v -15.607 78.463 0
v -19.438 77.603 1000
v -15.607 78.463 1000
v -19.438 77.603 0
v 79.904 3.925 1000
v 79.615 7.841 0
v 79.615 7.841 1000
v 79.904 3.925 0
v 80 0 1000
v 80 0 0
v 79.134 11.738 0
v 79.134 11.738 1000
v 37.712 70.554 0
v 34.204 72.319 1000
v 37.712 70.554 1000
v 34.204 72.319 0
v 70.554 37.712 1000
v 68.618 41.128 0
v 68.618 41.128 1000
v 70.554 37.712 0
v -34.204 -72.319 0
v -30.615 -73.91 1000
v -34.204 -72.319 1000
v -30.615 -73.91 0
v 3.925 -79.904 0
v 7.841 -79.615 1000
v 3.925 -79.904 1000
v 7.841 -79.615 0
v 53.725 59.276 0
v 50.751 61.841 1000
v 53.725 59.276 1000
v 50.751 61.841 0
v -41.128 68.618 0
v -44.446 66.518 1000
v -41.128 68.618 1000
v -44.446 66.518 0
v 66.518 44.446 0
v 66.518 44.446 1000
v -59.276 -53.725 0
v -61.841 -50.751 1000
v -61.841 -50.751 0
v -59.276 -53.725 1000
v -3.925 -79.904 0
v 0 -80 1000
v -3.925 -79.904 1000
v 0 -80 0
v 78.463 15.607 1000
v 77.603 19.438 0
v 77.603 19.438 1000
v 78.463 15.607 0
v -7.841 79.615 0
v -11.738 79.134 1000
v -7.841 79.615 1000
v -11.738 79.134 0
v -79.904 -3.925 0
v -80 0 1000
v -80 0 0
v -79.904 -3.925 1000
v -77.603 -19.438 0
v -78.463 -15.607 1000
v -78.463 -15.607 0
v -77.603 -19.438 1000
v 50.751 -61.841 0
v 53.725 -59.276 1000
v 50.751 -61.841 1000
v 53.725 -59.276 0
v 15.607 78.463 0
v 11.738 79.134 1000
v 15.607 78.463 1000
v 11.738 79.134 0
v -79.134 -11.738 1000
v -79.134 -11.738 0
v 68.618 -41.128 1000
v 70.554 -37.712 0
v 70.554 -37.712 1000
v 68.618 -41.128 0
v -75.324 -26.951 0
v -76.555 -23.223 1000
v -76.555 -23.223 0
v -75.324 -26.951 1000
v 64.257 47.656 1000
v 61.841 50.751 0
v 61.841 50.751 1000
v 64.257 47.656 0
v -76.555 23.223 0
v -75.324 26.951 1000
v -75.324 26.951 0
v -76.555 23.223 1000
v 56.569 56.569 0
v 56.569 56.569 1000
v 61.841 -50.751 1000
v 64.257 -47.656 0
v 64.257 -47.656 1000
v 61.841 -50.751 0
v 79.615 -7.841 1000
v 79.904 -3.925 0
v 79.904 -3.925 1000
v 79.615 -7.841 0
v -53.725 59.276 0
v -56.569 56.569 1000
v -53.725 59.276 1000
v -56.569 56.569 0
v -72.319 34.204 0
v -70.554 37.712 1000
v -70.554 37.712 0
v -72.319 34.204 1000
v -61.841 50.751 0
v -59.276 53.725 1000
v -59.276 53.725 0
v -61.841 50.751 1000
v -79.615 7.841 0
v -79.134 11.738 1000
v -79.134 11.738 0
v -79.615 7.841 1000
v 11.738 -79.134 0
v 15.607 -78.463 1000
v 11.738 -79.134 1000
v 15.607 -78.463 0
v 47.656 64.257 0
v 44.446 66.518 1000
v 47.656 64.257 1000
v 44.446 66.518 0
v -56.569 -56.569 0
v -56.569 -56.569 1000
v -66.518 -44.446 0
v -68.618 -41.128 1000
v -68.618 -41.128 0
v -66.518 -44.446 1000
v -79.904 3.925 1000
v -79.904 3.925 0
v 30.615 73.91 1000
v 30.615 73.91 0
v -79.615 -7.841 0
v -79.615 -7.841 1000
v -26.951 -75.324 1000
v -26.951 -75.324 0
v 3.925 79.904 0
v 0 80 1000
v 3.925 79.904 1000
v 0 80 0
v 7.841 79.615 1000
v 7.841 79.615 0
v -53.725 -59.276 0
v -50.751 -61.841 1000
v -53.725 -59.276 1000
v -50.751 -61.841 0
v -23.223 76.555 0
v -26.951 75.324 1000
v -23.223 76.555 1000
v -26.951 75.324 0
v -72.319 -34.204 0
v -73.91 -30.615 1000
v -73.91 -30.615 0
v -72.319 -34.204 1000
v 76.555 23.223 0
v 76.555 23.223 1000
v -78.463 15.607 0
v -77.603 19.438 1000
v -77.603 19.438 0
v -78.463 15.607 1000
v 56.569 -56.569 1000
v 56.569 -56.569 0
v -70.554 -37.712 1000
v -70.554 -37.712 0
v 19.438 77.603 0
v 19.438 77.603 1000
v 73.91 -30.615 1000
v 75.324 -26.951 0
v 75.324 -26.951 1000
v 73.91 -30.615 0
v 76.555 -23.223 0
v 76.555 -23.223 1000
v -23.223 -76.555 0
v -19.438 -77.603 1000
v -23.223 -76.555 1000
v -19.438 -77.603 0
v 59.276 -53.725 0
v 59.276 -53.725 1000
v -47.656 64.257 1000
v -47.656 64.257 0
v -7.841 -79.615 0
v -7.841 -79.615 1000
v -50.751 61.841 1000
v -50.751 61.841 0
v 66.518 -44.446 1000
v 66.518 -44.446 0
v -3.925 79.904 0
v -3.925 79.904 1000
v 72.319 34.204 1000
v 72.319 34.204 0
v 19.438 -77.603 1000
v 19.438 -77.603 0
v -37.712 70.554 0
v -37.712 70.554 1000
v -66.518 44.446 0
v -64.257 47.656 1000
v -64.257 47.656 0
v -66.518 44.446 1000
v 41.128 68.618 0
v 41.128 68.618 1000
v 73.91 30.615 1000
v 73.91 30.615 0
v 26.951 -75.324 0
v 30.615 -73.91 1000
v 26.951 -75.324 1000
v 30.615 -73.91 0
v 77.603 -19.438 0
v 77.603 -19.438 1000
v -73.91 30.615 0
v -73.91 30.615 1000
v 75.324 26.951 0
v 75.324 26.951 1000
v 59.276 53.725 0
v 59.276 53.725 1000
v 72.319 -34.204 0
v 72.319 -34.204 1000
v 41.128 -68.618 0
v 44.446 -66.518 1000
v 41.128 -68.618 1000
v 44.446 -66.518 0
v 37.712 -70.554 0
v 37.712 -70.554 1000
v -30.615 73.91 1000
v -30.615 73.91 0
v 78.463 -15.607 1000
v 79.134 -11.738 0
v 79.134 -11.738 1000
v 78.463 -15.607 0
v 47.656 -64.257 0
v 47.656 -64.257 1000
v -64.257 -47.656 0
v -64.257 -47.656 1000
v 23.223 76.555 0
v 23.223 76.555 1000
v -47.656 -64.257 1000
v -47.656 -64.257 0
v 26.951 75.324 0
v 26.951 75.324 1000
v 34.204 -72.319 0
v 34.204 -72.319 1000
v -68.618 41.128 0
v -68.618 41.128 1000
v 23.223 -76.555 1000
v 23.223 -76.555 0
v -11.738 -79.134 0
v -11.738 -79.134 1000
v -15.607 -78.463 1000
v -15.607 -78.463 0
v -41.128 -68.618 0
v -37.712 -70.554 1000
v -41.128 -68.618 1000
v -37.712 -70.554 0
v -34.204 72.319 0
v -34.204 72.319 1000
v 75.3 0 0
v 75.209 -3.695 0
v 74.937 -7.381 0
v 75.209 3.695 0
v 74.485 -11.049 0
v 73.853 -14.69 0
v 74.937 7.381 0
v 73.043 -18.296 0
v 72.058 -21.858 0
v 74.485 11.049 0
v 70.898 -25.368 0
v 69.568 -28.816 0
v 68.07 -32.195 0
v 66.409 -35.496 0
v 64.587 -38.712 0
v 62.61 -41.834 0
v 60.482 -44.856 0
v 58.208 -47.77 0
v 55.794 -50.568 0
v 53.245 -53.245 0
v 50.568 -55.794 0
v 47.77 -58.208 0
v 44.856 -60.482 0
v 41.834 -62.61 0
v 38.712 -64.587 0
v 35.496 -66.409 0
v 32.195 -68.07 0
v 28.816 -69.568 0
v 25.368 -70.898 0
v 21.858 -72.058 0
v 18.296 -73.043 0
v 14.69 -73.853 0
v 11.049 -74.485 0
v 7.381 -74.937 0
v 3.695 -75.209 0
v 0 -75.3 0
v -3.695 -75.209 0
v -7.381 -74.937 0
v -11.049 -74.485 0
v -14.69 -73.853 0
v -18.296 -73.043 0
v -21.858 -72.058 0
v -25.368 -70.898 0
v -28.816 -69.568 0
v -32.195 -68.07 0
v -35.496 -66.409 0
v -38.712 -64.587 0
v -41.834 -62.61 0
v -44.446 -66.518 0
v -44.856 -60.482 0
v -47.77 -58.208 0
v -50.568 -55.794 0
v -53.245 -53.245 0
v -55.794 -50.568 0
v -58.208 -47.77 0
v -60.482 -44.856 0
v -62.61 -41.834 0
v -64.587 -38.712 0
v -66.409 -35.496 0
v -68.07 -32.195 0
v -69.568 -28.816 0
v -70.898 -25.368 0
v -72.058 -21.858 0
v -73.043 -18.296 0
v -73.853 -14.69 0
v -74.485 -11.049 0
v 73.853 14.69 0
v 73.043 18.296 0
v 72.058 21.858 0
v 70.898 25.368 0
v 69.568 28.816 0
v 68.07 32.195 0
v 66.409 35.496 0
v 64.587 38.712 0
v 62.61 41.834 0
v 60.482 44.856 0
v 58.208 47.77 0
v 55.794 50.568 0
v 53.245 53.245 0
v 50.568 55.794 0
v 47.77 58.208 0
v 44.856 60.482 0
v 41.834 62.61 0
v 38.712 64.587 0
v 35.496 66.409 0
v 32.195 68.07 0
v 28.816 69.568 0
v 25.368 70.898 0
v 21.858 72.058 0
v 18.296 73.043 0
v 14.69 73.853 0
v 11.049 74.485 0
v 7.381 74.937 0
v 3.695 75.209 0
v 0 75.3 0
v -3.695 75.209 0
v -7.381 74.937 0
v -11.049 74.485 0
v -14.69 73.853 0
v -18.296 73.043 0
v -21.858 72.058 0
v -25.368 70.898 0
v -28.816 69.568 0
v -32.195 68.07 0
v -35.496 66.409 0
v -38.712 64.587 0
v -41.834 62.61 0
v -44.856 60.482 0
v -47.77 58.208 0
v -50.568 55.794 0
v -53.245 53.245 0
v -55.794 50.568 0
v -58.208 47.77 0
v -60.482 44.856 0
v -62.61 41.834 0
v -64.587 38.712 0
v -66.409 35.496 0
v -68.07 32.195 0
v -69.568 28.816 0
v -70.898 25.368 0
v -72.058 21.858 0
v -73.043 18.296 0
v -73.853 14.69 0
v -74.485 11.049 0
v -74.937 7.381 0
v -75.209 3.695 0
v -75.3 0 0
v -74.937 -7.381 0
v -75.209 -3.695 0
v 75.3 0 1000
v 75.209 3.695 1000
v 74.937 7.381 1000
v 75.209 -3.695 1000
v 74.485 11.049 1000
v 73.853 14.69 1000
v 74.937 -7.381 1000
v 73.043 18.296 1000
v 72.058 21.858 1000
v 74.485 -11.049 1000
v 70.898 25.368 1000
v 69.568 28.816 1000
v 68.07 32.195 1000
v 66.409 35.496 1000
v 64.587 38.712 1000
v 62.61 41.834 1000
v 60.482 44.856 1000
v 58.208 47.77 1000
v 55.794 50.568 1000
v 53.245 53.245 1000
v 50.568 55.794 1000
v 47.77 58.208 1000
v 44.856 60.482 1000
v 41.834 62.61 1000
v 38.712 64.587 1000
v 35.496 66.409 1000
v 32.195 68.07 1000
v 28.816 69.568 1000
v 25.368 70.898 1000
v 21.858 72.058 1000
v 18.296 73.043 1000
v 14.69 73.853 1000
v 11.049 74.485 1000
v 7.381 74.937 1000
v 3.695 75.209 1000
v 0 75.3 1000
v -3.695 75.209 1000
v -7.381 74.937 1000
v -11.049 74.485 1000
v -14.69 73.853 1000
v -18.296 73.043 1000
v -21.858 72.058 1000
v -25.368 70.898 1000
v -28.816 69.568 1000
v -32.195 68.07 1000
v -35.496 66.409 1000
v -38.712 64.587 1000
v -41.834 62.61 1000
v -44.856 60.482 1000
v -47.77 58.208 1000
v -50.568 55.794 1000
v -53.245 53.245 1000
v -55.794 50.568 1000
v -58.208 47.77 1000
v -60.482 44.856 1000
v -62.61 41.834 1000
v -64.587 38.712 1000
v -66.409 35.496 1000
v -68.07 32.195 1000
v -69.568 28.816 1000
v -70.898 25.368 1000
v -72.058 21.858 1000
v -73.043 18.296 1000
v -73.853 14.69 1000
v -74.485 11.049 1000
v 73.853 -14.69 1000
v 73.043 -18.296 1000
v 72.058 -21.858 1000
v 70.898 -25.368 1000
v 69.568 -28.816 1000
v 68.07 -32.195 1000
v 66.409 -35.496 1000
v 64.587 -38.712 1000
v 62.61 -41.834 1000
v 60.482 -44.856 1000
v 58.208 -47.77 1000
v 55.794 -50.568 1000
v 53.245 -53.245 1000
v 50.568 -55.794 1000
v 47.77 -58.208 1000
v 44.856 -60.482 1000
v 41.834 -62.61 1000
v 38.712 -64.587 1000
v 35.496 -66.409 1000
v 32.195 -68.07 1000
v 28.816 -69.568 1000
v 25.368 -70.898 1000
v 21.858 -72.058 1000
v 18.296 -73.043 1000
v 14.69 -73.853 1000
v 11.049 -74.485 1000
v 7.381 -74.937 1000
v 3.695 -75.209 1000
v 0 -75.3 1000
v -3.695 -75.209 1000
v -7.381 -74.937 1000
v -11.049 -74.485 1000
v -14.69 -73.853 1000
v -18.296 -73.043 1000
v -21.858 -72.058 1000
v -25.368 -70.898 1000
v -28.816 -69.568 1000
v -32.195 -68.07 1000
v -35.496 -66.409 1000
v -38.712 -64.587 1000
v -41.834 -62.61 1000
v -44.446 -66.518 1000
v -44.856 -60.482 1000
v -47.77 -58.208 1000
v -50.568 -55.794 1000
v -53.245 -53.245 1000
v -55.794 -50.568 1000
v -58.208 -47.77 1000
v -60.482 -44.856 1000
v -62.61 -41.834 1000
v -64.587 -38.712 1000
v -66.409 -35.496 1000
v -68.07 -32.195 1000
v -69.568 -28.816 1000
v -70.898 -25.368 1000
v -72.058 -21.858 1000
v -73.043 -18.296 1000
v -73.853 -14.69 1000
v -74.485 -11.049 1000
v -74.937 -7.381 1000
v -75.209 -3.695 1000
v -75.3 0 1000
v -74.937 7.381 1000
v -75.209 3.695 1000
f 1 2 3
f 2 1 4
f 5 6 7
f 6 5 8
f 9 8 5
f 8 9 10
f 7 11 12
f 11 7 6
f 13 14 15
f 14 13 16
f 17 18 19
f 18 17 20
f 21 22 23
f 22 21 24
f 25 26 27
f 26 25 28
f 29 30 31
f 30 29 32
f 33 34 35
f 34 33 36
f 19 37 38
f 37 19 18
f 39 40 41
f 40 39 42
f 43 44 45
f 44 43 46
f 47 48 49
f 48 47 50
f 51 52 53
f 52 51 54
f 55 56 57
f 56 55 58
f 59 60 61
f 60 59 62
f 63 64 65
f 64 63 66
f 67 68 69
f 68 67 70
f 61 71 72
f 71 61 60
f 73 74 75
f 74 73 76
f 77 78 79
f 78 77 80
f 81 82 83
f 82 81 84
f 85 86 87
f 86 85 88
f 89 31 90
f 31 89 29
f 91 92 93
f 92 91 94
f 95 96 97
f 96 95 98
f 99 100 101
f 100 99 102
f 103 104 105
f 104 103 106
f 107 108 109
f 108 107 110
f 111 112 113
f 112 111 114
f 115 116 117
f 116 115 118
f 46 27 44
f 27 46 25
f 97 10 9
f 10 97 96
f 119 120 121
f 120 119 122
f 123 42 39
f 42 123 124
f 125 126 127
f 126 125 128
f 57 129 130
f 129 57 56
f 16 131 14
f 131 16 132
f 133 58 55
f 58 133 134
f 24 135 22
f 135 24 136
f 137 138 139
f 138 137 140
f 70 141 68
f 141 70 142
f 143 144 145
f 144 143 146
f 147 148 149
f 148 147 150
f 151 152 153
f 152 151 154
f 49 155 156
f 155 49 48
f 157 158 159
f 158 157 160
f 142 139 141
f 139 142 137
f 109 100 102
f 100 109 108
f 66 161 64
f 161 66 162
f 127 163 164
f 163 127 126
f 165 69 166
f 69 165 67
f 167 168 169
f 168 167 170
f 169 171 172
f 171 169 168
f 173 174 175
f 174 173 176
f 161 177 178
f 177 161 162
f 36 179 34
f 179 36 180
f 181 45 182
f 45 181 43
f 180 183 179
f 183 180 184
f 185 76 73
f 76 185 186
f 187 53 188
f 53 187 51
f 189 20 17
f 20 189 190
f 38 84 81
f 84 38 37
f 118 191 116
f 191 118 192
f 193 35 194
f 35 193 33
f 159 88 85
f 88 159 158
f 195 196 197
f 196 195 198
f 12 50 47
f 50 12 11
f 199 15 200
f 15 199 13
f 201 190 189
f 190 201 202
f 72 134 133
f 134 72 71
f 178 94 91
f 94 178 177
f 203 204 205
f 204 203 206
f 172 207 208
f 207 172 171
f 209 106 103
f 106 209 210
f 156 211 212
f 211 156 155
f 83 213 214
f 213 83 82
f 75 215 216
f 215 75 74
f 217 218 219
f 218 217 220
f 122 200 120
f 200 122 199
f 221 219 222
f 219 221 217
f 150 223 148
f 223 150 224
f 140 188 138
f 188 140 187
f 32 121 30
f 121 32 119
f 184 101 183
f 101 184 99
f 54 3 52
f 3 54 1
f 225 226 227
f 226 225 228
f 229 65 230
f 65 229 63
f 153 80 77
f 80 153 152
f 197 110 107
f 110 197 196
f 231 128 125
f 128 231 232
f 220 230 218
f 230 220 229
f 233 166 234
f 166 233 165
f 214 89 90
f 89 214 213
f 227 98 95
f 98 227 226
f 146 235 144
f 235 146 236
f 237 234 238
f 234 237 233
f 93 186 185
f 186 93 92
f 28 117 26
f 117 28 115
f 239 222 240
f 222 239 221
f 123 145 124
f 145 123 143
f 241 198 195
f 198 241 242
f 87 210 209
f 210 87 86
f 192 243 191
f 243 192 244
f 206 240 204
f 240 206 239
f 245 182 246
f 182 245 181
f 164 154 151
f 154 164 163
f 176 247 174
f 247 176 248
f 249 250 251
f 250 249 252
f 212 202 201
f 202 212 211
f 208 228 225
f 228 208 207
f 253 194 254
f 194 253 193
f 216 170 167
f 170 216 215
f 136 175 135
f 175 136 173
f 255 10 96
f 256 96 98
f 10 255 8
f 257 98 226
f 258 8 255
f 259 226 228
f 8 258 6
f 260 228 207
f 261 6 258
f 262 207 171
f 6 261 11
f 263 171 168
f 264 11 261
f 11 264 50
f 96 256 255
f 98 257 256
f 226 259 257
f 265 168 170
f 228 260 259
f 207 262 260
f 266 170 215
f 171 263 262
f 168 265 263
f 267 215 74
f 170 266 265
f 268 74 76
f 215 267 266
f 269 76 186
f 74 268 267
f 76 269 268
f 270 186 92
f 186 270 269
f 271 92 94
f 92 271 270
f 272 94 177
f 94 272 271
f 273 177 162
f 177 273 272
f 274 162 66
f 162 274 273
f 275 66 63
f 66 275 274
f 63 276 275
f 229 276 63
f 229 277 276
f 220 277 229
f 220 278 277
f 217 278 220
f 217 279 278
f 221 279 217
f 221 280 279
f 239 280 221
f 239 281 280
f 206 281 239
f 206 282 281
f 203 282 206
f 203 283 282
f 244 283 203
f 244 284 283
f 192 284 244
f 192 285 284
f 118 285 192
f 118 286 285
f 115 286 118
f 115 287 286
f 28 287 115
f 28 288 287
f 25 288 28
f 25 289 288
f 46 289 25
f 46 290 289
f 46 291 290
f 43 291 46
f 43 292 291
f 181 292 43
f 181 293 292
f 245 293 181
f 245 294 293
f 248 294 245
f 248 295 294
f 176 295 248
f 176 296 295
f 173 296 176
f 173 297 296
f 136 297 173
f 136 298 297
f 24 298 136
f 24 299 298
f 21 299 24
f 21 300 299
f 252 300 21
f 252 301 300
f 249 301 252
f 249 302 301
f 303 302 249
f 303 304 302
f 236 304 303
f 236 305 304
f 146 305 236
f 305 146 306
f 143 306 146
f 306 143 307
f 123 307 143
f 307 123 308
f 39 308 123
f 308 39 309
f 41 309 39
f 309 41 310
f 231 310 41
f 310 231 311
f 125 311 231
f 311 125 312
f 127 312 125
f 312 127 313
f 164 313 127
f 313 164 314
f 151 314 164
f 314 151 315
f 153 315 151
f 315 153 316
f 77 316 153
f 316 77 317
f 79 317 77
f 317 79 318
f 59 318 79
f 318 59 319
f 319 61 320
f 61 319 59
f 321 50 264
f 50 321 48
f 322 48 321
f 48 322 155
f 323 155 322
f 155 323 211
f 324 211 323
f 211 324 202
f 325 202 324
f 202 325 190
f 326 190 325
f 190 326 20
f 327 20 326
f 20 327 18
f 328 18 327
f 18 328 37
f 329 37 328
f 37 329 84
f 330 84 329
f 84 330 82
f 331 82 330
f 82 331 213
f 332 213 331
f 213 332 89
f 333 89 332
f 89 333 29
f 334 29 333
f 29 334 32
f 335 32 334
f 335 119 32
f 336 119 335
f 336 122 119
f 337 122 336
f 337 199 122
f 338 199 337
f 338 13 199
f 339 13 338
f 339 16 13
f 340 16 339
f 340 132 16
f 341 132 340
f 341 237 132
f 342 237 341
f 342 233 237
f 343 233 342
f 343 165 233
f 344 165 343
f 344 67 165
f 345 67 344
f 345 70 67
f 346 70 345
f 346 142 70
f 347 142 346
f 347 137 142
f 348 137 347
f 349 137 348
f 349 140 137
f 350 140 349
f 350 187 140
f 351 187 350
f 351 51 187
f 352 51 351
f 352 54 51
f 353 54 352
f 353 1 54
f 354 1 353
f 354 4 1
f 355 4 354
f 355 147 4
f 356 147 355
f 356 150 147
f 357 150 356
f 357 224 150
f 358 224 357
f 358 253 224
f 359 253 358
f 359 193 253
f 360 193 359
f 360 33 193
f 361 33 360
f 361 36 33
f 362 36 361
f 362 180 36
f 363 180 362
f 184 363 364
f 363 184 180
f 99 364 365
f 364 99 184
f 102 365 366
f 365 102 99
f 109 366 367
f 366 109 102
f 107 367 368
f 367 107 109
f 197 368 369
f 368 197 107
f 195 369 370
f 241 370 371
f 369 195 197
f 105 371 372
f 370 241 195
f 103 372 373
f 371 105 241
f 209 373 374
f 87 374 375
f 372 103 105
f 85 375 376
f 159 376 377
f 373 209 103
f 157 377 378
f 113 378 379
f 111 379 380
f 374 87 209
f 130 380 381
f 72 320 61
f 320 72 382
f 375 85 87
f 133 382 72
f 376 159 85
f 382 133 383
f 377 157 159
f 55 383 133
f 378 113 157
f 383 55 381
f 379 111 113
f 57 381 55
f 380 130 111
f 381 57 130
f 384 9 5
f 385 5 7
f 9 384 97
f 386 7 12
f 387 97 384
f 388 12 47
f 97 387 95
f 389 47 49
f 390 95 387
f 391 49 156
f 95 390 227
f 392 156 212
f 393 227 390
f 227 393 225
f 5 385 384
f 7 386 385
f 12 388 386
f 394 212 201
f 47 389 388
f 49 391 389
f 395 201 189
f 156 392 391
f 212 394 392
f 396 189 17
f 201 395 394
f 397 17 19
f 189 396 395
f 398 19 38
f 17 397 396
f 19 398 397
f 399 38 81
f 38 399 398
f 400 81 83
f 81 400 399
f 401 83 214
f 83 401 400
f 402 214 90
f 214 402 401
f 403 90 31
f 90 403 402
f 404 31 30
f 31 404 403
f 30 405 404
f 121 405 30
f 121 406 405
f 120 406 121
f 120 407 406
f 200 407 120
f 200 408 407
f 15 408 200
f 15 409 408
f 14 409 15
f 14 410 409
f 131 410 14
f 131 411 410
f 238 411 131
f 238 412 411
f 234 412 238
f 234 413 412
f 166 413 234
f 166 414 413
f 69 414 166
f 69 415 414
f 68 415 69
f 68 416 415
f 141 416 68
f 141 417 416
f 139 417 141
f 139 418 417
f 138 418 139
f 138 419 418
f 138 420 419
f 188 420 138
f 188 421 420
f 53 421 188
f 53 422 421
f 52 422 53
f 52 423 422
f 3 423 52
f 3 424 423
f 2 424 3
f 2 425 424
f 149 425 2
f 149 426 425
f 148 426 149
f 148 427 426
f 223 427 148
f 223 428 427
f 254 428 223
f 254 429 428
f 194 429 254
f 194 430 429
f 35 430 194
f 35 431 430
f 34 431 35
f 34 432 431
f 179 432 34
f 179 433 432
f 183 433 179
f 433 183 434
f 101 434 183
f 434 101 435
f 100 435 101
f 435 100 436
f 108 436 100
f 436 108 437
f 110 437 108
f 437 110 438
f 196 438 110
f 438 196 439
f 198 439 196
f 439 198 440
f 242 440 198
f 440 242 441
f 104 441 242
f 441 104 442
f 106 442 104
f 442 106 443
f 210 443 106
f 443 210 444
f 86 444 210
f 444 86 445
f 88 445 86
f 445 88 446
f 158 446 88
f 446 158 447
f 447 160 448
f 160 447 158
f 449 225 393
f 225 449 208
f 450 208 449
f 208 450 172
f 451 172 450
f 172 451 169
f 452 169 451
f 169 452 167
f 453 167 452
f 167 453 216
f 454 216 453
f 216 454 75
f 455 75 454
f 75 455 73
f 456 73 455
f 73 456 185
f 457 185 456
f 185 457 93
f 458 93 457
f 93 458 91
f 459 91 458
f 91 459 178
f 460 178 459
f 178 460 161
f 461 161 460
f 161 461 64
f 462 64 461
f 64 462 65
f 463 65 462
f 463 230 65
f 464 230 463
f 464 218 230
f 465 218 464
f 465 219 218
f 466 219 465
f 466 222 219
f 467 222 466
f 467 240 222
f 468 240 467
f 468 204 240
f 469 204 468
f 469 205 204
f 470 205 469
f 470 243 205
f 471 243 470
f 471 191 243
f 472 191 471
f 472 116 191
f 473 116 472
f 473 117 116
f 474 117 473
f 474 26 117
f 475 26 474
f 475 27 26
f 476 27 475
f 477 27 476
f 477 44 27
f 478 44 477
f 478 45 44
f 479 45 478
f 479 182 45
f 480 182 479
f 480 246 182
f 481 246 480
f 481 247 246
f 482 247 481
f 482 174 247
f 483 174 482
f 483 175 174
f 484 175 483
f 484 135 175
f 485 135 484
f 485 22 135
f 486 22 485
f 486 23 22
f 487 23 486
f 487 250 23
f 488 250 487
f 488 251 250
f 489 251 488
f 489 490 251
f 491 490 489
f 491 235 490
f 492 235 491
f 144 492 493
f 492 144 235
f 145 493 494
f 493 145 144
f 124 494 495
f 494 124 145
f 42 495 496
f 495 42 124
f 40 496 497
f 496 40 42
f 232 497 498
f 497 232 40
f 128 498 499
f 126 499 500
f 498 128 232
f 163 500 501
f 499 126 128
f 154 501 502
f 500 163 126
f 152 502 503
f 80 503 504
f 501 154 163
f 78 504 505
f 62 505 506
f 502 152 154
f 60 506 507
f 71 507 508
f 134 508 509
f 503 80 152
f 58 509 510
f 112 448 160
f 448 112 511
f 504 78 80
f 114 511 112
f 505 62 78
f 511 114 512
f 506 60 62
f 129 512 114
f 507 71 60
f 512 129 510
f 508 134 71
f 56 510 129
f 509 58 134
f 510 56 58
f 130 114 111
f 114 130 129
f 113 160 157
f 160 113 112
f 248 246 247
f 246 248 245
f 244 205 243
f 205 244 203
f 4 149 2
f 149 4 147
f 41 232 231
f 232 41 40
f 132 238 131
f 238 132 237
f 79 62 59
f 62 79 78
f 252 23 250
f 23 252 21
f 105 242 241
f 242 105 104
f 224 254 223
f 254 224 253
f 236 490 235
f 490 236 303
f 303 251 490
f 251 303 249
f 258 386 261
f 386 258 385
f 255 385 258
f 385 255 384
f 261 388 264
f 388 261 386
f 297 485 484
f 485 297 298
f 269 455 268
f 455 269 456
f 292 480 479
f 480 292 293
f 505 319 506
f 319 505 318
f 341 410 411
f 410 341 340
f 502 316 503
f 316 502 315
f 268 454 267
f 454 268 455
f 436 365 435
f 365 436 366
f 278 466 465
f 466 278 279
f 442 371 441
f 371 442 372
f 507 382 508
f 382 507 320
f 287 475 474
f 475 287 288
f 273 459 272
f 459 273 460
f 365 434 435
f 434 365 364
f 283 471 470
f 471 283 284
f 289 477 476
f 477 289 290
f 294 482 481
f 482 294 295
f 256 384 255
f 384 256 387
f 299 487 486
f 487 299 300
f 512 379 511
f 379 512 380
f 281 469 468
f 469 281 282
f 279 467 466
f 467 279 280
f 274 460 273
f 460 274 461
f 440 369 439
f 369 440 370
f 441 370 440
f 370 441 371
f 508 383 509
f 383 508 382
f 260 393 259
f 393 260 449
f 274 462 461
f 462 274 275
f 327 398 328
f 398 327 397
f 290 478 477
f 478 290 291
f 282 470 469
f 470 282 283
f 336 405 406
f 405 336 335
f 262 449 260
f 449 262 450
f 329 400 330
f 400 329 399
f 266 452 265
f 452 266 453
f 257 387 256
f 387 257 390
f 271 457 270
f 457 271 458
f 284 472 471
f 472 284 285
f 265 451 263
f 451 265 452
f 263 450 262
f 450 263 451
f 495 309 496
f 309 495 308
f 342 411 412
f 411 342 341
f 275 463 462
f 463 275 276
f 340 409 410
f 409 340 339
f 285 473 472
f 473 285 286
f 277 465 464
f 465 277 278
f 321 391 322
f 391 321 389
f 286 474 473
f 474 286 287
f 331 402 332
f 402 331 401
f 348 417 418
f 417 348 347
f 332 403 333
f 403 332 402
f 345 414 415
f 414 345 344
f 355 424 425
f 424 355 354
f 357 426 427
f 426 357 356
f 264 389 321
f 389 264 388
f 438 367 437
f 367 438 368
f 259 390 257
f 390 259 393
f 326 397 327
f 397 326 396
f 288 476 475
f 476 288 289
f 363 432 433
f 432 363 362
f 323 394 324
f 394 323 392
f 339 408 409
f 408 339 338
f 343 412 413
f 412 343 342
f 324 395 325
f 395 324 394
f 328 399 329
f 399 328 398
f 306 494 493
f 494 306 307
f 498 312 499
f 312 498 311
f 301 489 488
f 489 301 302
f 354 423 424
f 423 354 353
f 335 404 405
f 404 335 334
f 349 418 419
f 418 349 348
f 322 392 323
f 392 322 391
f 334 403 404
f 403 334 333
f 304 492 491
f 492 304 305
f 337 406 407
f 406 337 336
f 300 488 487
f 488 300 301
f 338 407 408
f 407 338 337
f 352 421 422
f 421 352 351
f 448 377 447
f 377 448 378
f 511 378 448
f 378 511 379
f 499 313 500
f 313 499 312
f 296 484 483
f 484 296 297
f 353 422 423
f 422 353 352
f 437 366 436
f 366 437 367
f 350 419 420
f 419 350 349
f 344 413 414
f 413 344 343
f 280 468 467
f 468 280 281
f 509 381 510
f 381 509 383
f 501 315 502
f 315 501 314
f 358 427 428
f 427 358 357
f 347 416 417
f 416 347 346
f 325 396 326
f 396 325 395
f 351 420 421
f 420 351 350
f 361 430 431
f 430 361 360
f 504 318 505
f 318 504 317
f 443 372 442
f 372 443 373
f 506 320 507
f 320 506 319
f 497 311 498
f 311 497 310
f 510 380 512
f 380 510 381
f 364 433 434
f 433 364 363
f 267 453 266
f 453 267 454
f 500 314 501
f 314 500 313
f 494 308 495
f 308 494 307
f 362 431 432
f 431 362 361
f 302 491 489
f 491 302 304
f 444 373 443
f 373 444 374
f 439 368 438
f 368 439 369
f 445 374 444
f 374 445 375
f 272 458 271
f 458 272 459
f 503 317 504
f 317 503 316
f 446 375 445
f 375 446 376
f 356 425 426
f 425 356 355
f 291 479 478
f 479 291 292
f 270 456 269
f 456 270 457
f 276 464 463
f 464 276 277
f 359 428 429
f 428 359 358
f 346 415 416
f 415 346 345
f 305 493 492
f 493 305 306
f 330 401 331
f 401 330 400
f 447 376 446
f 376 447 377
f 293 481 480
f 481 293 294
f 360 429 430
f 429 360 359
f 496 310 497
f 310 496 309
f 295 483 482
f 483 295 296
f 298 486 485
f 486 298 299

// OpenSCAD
$fn=128;

// HT pipe parameters (approximation)
outer_d = 160;      // mm
length  = 1000;     // mm
wall    = 4.7;      // mm (typical for DN160 HT pipe; adjust if needed)

inner_d = outer_d - 2*wall;

difference() {
    cylinder(h=length, d=outer_d, center=false);
    translate([0,0,-0.1])
        cylinder(h=length+0.2, d=inner_d, center=false);
}
